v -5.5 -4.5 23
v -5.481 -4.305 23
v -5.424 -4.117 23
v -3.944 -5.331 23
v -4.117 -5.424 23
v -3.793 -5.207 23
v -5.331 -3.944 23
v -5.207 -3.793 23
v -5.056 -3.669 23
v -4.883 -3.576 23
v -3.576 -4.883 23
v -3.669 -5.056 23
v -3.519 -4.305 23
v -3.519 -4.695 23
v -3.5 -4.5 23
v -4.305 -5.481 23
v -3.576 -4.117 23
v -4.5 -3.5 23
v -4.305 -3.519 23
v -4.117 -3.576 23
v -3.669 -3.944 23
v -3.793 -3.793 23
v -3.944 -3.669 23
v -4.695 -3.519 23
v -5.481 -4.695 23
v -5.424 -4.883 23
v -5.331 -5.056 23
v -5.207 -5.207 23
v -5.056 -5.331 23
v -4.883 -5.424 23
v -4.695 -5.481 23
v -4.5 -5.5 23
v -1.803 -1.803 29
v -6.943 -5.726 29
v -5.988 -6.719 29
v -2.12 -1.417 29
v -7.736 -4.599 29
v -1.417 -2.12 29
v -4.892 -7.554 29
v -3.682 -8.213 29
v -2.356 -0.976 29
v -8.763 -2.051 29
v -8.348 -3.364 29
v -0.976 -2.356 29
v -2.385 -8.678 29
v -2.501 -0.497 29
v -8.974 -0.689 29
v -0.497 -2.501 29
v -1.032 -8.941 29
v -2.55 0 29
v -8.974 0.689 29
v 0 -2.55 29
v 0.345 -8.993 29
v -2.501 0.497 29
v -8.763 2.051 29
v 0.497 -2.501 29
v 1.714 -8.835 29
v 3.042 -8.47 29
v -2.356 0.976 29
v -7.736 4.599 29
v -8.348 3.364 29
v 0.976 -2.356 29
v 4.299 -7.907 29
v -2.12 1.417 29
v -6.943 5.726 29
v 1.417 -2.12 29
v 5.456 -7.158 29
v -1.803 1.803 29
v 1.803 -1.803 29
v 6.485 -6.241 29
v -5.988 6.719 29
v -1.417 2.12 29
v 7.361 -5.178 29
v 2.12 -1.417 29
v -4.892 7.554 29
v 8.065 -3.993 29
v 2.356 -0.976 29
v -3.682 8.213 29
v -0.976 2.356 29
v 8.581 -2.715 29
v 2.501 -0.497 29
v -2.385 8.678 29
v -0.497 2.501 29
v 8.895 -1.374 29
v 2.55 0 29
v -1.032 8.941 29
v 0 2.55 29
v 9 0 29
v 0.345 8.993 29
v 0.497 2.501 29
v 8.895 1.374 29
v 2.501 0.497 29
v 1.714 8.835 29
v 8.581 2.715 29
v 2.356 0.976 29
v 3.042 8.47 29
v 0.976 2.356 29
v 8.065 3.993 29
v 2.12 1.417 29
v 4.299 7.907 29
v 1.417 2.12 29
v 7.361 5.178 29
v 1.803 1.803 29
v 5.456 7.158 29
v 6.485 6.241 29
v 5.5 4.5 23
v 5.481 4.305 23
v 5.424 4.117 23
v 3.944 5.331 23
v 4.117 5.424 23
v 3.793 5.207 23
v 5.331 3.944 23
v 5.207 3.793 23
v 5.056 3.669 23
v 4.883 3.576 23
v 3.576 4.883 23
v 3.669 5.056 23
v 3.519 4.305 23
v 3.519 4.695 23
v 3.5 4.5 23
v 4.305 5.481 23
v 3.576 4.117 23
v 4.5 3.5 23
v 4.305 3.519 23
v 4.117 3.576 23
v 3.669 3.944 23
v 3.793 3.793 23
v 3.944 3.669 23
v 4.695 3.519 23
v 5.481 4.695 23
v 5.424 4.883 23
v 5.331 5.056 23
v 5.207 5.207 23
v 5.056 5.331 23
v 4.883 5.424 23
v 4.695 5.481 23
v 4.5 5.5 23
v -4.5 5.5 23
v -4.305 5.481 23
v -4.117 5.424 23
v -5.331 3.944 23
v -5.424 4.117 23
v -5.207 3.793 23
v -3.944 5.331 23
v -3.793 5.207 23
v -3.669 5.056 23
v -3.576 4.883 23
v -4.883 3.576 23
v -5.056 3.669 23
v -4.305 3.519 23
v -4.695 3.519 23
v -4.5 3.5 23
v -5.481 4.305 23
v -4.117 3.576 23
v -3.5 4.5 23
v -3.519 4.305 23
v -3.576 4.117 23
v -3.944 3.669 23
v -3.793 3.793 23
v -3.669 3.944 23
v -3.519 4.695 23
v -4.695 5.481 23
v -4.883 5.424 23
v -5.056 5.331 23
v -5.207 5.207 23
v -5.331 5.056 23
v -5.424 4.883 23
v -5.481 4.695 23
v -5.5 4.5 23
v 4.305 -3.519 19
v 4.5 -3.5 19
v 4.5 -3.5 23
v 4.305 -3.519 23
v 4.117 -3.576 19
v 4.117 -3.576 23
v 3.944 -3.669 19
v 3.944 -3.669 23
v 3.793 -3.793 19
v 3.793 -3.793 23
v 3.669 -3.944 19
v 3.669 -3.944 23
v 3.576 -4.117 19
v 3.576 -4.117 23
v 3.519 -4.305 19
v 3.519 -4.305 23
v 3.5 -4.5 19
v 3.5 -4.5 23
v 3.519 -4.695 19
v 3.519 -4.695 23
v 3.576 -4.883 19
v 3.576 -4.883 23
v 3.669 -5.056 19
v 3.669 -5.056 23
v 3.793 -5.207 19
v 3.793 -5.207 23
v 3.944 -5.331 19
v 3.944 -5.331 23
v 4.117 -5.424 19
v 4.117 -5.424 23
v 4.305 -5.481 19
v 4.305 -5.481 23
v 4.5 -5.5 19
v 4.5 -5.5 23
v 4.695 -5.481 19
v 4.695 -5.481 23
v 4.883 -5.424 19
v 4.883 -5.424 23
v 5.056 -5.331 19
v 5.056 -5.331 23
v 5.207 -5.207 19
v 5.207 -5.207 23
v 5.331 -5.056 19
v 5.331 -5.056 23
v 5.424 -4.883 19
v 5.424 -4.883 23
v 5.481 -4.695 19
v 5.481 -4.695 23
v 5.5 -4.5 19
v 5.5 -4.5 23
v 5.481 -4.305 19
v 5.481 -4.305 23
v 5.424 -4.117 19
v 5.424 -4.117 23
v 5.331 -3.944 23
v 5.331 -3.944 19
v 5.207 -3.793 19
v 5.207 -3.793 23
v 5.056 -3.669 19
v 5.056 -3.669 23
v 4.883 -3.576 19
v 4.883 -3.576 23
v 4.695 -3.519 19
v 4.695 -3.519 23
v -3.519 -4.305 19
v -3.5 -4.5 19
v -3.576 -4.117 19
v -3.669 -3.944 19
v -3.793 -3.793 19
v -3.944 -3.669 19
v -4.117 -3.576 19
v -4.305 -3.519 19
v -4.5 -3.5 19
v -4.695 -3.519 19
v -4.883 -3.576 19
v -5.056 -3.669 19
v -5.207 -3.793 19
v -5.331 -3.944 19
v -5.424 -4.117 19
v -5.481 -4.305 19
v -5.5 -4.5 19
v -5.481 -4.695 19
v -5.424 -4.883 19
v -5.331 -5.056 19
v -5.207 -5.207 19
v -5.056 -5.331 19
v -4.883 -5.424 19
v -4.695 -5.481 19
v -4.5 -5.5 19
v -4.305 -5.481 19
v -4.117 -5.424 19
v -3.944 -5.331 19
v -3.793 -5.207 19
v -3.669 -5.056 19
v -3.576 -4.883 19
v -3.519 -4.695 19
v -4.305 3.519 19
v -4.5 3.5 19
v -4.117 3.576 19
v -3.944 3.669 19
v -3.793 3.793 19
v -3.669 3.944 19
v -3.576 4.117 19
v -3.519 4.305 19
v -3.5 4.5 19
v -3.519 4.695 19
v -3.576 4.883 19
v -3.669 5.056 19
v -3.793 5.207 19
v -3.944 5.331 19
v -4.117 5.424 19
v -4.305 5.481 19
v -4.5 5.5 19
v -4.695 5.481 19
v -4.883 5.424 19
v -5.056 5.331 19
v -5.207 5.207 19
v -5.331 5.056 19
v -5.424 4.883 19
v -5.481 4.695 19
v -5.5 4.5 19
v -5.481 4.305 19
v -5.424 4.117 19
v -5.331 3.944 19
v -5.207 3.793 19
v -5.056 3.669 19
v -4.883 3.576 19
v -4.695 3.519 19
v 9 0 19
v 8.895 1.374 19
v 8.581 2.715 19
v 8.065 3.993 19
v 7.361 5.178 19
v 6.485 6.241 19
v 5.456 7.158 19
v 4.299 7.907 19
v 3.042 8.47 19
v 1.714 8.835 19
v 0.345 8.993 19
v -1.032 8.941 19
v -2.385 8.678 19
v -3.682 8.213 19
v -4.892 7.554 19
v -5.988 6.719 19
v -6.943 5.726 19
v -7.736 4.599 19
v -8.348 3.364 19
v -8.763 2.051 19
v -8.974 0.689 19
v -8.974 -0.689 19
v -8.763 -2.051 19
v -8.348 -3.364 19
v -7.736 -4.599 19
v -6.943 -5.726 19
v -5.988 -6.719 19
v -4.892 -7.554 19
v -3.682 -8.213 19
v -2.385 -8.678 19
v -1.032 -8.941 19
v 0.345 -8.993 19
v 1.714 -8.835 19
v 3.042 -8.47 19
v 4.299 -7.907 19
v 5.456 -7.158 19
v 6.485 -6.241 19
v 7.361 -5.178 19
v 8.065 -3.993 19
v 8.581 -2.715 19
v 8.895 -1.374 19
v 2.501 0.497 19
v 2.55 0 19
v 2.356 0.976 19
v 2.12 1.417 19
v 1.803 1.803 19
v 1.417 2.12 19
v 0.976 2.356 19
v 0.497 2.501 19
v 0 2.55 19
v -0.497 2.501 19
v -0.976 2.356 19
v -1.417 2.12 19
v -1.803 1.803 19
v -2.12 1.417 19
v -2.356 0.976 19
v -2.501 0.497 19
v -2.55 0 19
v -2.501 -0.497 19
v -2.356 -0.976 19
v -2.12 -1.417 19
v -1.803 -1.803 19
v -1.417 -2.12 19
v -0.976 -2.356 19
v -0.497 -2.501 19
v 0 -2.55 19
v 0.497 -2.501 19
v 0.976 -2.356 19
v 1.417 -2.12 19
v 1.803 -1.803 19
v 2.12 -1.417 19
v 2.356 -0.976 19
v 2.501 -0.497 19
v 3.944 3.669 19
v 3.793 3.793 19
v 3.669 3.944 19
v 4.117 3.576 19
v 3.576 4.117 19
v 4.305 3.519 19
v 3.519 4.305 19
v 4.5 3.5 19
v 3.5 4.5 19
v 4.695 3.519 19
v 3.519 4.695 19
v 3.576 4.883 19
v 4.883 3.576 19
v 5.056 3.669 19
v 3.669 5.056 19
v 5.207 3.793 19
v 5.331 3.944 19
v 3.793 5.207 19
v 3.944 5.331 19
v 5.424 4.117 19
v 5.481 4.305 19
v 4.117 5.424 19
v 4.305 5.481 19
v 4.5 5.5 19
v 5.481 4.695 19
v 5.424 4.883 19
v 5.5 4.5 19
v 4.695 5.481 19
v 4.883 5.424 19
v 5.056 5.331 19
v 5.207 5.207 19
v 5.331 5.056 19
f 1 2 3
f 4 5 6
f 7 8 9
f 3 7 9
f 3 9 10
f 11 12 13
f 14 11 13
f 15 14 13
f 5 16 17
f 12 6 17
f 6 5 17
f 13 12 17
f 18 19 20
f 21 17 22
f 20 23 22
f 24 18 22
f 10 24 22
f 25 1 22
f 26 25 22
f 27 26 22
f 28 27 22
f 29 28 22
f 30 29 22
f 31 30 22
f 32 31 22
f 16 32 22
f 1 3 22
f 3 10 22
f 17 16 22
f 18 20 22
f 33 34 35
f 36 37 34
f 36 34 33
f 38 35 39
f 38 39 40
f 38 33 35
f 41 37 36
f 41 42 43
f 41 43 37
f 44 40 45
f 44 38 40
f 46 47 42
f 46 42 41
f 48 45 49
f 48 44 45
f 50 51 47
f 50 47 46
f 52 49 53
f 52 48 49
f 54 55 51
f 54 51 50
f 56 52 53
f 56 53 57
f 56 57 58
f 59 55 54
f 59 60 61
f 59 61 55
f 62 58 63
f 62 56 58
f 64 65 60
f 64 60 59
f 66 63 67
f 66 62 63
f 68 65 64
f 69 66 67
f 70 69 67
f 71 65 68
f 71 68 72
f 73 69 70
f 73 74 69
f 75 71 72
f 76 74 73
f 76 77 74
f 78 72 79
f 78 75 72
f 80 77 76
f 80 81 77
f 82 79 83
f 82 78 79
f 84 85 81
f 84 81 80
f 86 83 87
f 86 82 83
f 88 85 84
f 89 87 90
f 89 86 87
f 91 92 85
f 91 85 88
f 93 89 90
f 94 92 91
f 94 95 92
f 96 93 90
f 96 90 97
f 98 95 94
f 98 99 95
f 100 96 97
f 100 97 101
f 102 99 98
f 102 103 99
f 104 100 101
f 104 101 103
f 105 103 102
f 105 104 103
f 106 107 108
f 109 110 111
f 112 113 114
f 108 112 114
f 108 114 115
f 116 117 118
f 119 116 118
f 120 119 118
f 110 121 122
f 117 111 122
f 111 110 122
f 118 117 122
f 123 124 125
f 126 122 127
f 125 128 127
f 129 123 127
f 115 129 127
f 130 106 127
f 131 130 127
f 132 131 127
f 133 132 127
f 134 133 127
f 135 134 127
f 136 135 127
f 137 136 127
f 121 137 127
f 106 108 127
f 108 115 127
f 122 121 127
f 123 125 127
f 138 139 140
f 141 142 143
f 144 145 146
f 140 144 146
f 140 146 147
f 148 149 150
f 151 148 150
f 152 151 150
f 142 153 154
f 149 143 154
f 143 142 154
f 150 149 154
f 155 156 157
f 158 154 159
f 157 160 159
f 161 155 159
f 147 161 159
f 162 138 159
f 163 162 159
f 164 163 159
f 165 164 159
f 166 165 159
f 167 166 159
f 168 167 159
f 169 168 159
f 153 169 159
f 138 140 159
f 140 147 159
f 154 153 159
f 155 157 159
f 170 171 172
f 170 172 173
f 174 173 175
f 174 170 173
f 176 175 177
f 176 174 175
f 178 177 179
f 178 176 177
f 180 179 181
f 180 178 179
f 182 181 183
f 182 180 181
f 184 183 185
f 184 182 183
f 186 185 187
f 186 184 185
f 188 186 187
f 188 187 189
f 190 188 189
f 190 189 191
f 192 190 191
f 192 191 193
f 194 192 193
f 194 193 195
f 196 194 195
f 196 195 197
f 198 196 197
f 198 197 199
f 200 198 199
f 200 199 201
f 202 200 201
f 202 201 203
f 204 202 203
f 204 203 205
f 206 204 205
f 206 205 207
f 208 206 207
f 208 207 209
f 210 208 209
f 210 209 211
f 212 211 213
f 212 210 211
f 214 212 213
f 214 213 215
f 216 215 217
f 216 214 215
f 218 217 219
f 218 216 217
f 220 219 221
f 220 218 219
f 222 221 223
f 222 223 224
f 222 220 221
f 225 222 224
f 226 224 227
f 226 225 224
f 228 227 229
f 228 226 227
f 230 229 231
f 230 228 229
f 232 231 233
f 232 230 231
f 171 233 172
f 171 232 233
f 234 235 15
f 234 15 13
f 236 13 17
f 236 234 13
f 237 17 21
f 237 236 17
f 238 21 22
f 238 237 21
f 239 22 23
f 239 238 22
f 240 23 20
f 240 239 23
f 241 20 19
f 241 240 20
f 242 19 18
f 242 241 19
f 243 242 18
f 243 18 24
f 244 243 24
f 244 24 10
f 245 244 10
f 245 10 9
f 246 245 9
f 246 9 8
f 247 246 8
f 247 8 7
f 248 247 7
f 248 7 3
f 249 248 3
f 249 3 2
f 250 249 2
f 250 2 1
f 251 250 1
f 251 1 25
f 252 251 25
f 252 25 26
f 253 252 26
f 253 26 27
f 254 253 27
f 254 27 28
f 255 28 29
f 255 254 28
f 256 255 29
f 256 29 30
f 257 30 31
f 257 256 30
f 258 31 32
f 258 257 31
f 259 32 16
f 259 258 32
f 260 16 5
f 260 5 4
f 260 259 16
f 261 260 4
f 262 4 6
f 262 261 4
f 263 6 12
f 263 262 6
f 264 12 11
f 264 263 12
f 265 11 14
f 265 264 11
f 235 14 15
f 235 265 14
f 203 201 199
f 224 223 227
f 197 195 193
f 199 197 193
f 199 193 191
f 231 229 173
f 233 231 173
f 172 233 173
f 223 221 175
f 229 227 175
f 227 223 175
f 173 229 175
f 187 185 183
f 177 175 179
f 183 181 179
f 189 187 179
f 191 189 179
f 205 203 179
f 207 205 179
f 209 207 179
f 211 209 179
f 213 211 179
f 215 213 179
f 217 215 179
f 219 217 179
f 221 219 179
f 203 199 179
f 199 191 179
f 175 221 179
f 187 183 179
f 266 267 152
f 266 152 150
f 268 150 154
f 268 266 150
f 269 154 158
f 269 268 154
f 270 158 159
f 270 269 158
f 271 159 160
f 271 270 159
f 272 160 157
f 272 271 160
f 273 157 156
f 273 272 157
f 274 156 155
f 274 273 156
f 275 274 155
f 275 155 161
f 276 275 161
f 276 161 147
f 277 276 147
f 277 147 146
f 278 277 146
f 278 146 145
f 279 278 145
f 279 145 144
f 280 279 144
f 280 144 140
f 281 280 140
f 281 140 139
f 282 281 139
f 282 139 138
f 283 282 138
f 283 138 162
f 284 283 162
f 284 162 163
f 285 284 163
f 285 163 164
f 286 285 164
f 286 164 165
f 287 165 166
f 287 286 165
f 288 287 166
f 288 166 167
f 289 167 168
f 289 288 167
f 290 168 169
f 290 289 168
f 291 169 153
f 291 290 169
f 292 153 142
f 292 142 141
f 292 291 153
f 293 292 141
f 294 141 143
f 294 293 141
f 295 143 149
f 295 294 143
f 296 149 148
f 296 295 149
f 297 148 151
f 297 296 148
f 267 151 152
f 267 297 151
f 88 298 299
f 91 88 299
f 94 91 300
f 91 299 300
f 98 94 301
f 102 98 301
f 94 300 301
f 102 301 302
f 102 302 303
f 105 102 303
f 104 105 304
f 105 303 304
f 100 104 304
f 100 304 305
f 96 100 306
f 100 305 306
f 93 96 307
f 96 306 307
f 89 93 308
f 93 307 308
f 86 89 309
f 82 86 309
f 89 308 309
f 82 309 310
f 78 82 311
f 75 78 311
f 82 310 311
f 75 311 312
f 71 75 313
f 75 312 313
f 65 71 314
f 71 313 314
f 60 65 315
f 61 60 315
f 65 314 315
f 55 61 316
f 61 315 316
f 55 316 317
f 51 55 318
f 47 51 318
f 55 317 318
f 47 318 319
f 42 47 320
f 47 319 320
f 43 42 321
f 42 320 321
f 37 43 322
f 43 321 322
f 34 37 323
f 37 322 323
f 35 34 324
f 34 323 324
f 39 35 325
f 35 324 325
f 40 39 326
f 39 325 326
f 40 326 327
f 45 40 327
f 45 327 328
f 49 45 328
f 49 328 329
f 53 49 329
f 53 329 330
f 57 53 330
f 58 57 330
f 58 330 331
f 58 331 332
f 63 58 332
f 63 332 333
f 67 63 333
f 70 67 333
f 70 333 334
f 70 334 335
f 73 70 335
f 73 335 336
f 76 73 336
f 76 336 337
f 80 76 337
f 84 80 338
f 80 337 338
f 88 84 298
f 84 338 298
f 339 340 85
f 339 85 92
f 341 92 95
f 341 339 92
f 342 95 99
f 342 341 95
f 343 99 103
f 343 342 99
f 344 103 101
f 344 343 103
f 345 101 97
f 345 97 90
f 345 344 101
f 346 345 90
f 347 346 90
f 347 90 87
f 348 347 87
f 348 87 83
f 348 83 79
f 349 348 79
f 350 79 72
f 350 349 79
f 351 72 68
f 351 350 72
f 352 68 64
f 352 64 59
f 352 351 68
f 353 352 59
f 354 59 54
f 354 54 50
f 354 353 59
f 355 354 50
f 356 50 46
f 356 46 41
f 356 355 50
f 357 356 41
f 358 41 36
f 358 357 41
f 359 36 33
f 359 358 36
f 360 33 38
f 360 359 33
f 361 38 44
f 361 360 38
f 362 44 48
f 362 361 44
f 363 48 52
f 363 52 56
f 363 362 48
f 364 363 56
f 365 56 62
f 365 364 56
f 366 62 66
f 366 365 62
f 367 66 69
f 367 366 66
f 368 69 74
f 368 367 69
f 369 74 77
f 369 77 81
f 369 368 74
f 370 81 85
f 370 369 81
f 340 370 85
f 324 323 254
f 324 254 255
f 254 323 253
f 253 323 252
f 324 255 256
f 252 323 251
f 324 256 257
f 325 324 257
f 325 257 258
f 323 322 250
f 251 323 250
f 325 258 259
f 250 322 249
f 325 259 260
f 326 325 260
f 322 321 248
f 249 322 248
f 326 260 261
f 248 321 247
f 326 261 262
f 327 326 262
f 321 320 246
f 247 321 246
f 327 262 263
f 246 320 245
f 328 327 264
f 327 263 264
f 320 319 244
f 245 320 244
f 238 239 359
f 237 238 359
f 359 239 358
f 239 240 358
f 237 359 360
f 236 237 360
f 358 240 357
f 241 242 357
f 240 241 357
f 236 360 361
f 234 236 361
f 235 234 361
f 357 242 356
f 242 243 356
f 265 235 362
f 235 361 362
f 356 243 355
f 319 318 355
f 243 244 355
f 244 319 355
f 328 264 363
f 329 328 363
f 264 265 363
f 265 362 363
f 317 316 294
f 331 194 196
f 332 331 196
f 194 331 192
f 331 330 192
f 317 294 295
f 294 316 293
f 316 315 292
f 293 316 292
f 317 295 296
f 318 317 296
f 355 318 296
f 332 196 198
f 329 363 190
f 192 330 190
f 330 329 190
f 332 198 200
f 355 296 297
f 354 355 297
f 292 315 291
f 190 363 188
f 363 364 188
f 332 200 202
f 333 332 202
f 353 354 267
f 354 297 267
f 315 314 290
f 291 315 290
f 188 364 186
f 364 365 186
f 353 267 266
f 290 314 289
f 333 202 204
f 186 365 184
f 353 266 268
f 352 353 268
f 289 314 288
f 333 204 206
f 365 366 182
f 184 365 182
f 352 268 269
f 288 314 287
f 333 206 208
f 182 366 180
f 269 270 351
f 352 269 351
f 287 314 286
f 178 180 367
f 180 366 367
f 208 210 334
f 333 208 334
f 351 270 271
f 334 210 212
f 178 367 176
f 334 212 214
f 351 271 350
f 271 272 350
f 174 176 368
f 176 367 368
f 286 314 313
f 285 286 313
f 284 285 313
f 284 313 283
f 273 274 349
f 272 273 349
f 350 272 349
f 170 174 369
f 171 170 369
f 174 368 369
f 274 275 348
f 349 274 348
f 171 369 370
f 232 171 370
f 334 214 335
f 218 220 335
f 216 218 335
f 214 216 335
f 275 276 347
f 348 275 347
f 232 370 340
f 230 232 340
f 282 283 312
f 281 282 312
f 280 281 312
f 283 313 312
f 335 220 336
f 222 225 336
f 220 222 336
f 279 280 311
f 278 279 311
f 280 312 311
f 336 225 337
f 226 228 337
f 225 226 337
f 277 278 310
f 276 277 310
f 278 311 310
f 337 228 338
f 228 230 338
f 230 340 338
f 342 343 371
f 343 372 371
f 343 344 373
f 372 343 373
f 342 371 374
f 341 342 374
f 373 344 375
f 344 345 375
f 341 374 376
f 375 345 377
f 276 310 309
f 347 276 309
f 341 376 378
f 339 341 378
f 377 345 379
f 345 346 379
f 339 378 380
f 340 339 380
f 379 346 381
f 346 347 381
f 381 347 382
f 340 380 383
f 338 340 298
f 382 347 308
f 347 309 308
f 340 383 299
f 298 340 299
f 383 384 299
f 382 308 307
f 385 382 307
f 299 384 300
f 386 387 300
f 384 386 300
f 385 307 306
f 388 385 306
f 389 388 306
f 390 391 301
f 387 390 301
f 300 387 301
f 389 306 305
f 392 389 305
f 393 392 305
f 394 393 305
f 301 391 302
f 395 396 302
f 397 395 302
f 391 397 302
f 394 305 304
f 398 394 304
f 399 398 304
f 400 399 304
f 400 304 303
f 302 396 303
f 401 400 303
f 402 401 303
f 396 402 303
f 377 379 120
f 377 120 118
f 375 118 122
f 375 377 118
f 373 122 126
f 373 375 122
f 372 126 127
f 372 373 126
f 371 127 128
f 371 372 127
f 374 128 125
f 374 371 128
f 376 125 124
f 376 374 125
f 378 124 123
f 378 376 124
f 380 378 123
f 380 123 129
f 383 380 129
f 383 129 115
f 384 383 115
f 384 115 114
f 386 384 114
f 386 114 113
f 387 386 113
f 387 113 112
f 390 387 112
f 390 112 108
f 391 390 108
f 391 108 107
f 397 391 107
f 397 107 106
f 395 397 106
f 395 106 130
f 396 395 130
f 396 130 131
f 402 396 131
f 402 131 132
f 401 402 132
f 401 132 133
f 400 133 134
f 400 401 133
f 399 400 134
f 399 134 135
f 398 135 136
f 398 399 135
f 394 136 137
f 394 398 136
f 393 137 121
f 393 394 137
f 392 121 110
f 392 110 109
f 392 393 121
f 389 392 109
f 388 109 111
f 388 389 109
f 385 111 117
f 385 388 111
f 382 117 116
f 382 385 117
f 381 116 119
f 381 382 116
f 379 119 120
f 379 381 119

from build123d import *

# Parameters (mm, degrees)
CYLINDER980_R     = 1
CYLINDER980_DEPTH = 20
CYLINDER977_R     = 1
CYLINDER977_DEPTH = 20
CYLINDER976_R     = 1
CYLINDER976_DEPTH = 20
CYLINDER979_R     = 1
CYLINDER979_DEPTH = 20
TUBE089_R         = 9
TUBE089_R_2       = 2.55
TUBE089_DEPTH     = 10


with BuildPart() as v_lec980:
    # Cylinder980 → Cylinder980 (new body)
    with BuildSketch(Plane(origin=(4.5, -4.5, -88), x_dir=(0, 1, 0), z_dir=(0, 0, 1))):
        Circle(CYLINDER980_R)
    extrude(amount=CYLINDER980_DEPTH)


with BuildPart() as v_lec977:
    # Cylinder977 → Cylinder977 (new body)
    with BuildSketch(Plane(origin=(4.5, 4.5, -88), x_dir=(-1, 0, 0), z_dir=(0, 0, 1))):
        Circle(CYLINDER977_R)
    extrude(amount=CYLINDER977_DEPTH)


with BuildPart() as v_lec976:
    # Cylinder976 → Cylinder976 (new body)
    with BuildSketch(Plane(origin=(-4.5, 4.5, -88), x_dir=(0, -1, 0), z_dir=(0, 0, 1))):
        Circle(CYLINDER976_R)
    extrude(amount=CYLINDER976_DEPTH)


with BuildPart() as compound809:
    # Cylinder979 → Cylinder979 (new body)
    with BuildSketch(Plane(origin=(-4.5, -4.5, -88), x_dir=(1, 0, 0), z_dir=(0, 0, 1))):
        Circle(CYLINDER979_R)
    extrude(amount=CYLINDER979_DEPTH)

    # Compound809: union Válec980, Válec977, Válec976
    add(v_lec980.part)
    add(v_lec977.part)
    add(v_lec976.part)


with BuildPart() as compound809_1:
    # Compound809 placement: moved
    add(compound809.part.moved(Location((0, 0, 91))))


with BuildPart() as cut413:
    # Tube089 → Tube089 (new body)
    with BuildSketch(Plane.XY.offset(19)):
        Circle(TUBE089_R)
        Circle(TUBE089_R_2, mode=Mode.SUBTRACT)
    extrude(amount=TUBE089_DEPTH)

    # Cut413: cut Compound809
    add(compound809_1.part, mode=Mode.SUBTRACT)


solid = cut413.part
